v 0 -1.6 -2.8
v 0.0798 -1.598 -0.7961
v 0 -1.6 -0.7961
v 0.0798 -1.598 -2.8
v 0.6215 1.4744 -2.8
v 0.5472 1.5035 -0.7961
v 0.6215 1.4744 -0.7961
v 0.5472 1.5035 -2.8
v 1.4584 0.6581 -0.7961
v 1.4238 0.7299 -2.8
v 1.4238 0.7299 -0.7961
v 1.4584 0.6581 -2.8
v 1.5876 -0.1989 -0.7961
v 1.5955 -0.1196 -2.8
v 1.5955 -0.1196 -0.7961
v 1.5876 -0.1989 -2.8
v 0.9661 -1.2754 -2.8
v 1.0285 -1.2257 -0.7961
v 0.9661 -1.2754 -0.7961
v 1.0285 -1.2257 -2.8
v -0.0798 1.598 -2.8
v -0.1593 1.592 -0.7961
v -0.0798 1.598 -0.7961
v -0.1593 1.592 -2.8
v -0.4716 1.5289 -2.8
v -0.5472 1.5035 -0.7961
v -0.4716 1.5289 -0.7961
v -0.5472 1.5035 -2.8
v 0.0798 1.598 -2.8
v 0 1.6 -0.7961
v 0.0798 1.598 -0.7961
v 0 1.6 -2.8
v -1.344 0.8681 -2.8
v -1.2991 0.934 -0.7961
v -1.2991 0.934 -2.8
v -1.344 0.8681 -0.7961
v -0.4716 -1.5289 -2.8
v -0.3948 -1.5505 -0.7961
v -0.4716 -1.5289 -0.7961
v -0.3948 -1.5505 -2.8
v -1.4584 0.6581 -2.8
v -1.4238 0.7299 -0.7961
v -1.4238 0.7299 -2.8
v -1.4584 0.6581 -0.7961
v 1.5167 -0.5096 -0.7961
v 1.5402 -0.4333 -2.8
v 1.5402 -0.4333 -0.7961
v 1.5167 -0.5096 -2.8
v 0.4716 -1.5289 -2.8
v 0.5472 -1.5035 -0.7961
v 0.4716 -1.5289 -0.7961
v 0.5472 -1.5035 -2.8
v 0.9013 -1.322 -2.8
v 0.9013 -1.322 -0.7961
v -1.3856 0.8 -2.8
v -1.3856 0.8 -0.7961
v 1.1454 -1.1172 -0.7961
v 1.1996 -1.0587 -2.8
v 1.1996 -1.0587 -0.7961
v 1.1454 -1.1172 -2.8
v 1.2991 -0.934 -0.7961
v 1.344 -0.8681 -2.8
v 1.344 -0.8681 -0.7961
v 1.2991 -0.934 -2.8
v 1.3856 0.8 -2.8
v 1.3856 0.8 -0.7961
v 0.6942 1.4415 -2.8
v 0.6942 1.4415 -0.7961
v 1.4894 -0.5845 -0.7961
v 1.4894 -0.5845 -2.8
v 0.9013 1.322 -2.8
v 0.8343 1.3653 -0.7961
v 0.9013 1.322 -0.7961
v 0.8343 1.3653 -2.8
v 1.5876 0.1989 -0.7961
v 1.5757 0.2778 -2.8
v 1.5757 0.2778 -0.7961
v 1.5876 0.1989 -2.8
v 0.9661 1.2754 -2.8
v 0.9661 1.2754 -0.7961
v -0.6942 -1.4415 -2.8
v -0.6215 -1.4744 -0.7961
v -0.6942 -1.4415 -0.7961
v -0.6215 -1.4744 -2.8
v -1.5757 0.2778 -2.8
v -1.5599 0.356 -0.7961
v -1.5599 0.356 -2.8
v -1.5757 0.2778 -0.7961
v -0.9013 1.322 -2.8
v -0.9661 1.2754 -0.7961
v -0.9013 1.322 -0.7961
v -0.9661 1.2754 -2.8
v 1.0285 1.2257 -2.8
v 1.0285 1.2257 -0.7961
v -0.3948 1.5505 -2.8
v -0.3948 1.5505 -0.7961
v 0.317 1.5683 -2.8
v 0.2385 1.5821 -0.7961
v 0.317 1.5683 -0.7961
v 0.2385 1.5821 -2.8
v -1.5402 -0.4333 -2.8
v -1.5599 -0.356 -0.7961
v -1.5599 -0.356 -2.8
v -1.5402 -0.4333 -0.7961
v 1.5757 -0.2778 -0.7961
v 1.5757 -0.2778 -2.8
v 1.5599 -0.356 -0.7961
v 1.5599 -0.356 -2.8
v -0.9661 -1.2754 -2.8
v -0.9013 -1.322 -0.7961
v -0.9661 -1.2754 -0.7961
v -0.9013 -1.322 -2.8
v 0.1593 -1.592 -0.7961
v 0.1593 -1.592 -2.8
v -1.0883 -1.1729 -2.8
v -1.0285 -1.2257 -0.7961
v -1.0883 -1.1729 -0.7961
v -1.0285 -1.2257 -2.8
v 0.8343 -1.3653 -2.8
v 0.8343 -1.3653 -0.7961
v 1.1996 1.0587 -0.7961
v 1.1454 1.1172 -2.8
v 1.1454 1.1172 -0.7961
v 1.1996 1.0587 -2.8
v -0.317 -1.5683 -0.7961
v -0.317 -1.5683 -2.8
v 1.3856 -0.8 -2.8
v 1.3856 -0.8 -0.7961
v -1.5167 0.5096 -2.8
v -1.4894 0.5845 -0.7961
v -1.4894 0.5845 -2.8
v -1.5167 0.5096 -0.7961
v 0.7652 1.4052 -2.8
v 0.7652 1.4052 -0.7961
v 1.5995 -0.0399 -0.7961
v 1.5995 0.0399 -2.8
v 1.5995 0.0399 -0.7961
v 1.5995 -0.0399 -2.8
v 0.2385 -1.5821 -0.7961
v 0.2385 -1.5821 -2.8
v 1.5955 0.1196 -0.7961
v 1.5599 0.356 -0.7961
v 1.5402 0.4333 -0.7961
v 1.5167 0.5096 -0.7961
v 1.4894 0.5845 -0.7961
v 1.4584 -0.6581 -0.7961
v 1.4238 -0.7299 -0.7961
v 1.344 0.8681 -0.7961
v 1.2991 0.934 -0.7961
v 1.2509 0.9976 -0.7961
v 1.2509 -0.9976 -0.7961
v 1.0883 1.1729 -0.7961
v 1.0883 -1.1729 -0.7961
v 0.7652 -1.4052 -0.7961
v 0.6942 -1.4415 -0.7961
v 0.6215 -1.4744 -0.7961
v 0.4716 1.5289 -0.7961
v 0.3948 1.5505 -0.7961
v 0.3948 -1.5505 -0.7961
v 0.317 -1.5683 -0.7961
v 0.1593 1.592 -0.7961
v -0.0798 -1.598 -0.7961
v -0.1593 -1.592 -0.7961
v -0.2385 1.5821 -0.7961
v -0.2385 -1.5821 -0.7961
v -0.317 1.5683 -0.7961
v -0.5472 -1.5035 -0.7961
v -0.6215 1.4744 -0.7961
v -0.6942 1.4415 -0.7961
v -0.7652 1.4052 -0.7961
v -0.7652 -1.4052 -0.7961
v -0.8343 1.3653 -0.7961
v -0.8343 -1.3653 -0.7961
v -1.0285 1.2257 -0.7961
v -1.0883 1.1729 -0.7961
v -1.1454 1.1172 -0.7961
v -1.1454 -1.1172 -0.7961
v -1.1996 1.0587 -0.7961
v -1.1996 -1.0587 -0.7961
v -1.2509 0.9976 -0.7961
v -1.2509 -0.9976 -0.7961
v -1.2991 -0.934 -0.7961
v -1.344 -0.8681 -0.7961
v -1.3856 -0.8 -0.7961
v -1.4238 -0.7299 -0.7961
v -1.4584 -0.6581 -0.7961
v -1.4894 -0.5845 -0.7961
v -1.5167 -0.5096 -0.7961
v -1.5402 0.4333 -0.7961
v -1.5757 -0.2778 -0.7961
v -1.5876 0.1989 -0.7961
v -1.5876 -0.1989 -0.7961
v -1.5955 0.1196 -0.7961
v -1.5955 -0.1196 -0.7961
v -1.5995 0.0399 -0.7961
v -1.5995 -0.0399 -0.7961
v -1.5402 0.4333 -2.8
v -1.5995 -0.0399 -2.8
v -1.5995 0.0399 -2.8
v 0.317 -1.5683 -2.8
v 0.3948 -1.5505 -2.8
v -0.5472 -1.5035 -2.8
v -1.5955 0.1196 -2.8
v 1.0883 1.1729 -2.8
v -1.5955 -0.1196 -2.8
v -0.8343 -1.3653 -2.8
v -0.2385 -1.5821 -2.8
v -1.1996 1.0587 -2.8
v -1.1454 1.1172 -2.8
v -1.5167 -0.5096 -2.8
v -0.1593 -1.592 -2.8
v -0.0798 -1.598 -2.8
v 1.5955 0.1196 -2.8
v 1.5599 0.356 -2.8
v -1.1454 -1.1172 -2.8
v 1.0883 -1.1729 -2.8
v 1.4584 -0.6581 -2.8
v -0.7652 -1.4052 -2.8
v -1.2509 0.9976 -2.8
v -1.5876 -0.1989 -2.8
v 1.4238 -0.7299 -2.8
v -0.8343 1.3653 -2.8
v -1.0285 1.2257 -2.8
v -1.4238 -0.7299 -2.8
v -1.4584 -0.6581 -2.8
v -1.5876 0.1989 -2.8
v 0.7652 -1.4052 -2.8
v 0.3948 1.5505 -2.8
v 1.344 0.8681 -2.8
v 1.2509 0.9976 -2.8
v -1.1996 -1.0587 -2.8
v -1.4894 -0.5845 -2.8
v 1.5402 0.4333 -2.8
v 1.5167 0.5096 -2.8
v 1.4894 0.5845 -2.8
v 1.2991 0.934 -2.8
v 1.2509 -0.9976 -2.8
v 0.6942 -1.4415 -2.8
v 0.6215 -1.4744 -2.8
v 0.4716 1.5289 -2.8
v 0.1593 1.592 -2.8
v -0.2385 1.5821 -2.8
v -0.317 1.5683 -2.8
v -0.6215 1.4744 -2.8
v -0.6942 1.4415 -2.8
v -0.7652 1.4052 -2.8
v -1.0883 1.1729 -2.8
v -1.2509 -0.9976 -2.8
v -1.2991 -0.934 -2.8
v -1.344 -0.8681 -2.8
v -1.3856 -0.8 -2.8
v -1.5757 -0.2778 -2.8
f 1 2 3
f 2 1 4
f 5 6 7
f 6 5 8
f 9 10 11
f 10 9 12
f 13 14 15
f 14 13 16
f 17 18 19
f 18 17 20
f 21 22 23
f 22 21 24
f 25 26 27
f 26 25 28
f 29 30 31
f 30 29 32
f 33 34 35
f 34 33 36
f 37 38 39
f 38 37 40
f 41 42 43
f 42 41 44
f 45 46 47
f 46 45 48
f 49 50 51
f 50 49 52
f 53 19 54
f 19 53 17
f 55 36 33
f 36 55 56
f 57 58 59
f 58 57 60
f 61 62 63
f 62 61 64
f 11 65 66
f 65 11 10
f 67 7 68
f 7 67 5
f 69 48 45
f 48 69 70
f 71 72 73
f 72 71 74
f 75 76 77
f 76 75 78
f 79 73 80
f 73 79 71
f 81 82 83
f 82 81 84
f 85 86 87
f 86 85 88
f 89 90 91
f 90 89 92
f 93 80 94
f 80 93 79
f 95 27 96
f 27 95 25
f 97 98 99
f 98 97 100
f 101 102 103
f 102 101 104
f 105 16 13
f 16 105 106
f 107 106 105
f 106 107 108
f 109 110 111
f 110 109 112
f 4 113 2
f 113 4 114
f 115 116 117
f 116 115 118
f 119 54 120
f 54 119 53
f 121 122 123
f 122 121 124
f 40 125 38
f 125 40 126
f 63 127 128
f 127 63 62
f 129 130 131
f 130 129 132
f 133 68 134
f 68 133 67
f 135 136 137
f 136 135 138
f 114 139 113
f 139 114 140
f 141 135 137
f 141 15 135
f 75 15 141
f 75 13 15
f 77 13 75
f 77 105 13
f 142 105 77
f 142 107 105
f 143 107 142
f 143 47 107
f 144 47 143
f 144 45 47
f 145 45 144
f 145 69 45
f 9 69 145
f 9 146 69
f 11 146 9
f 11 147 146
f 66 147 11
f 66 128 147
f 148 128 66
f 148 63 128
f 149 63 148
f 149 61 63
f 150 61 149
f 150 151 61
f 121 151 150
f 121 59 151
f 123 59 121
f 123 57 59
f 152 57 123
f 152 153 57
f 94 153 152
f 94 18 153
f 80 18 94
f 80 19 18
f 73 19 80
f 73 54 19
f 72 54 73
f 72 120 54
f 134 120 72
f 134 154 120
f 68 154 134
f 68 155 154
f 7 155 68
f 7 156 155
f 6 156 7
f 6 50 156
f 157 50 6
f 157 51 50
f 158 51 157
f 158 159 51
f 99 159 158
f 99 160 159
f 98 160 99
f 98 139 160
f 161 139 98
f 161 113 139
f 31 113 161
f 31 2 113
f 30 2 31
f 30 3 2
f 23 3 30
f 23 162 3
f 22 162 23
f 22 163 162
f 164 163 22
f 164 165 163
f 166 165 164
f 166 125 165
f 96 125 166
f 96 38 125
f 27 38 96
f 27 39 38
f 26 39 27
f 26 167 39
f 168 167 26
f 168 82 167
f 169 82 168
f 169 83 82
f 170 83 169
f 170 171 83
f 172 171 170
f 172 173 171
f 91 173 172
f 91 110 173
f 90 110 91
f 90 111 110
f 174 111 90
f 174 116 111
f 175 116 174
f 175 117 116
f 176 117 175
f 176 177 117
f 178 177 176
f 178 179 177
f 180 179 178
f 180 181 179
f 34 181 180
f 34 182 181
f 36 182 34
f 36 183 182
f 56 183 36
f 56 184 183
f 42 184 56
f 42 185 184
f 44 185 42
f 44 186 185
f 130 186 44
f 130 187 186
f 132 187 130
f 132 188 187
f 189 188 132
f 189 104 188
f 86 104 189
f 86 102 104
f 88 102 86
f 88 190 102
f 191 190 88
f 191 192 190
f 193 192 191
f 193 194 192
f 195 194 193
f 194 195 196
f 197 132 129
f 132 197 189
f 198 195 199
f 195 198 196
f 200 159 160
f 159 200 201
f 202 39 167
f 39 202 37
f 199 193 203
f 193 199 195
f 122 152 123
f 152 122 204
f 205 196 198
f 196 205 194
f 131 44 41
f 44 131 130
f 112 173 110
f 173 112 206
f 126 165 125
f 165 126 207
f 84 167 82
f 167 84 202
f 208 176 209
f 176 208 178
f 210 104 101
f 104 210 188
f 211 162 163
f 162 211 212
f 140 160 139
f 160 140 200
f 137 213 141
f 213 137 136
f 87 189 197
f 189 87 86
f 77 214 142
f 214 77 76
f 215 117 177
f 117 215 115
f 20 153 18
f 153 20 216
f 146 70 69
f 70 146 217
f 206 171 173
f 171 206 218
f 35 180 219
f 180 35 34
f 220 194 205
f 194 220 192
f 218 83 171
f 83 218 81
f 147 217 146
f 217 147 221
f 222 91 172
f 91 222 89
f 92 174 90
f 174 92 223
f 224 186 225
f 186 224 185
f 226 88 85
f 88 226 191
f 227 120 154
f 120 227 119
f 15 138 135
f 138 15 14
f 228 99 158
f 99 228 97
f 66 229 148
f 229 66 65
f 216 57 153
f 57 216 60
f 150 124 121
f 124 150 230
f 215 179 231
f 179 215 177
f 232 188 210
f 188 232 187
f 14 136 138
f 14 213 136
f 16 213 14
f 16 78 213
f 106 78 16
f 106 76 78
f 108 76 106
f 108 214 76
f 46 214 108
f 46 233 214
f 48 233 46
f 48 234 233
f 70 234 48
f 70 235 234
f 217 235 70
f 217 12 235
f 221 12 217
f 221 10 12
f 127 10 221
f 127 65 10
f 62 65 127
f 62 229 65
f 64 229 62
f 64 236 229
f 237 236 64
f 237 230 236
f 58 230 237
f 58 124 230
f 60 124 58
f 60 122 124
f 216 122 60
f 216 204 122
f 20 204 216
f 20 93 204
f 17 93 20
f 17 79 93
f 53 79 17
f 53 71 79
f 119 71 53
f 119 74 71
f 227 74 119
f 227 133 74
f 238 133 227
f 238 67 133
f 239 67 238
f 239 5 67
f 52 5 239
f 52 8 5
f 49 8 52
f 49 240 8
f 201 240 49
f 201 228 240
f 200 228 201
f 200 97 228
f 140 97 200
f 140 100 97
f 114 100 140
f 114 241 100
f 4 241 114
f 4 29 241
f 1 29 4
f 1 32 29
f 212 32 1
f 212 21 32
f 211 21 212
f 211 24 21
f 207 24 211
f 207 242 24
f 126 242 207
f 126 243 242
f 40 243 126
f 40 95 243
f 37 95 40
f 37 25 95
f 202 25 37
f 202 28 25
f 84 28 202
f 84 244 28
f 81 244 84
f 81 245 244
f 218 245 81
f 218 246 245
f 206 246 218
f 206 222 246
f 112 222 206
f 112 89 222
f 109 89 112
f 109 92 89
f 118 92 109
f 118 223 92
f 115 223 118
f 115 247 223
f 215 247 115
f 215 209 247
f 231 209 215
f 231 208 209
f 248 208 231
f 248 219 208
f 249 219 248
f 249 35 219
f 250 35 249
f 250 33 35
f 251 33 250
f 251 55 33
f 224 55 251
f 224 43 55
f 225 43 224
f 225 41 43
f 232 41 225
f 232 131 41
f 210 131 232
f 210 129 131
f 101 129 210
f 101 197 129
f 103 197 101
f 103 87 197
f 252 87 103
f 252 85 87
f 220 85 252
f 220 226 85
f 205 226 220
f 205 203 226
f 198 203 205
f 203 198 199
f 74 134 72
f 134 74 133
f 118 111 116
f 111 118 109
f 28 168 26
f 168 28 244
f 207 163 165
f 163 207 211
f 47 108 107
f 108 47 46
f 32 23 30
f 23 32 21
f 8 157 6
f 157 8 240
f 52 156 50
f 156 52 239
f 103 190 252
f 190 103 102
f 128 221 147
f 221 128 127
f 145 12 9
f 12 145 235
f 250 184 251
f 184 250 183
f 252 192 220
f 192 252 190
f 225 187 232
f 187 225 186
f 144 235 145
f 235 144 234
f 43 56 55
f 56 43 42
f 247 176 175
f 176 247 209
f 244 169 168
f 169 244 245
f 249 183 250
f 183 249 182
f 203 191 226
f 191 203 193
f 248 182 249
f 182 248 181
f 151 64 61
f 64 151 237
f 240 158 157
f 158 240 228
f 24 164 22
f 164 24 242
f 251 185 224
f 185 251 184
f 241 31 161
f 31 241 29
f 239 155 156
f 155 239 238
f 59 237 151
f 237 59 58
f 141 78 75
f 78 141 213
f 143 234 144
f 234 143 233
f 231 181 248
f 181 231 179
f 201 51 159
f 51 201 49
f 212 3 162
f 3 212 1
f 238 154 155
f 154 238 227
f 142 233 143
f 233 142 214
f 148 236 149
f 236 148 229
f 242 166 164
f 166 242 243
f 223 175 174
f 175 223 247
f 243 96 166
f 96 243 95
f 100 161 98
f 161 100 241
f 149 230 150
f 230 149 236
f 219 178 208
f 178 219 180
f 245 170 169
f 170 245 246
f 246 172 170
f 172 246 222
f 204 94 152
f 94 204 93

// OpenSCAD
use <../lib.scad>
use <3351a.scad>
$fa=1; $fs=0.2;
function ldraw_lib__649(realsolid=false) = [
// 0 ~Moved to 3351a
// 0 Name: 649.dat
// 0 Author: [PTadmin]
// 0 !LDRAW_ORG Part UPDATE 2010-02
// 0 !LICENSE Licensed under CC BY 4.0 : see CAreadme.txt
// 
// 0 BFC CERTIFY CCW
  [0,"BFC","CERTIFY"],
  [0,"BFC","CCW"],
// 
// 0 !HISTORY 2010-07-05 [PTadmin] Official Update 2010-02
// 
// 
// 0 // Roadsign Triangle
// 1 16 0 0 0 1 0 0 0 1 0 0 0 1 3351a.dat
  [1,16,0,0,0,1,0,0,0,1,0,0,0,1, ldraw_lib__3351a(realsolid)],
];
module ldraw_lib__649(step=0, col=false, unit=2/5, alt=false, line=0.2, solid=!$preview)
    makepoly(ldraw_lib__649(solid), step=step, col=col, unit=unit, alt=alt, line=line, solid=solid);
ldraw_lib__649(line=0.2);
